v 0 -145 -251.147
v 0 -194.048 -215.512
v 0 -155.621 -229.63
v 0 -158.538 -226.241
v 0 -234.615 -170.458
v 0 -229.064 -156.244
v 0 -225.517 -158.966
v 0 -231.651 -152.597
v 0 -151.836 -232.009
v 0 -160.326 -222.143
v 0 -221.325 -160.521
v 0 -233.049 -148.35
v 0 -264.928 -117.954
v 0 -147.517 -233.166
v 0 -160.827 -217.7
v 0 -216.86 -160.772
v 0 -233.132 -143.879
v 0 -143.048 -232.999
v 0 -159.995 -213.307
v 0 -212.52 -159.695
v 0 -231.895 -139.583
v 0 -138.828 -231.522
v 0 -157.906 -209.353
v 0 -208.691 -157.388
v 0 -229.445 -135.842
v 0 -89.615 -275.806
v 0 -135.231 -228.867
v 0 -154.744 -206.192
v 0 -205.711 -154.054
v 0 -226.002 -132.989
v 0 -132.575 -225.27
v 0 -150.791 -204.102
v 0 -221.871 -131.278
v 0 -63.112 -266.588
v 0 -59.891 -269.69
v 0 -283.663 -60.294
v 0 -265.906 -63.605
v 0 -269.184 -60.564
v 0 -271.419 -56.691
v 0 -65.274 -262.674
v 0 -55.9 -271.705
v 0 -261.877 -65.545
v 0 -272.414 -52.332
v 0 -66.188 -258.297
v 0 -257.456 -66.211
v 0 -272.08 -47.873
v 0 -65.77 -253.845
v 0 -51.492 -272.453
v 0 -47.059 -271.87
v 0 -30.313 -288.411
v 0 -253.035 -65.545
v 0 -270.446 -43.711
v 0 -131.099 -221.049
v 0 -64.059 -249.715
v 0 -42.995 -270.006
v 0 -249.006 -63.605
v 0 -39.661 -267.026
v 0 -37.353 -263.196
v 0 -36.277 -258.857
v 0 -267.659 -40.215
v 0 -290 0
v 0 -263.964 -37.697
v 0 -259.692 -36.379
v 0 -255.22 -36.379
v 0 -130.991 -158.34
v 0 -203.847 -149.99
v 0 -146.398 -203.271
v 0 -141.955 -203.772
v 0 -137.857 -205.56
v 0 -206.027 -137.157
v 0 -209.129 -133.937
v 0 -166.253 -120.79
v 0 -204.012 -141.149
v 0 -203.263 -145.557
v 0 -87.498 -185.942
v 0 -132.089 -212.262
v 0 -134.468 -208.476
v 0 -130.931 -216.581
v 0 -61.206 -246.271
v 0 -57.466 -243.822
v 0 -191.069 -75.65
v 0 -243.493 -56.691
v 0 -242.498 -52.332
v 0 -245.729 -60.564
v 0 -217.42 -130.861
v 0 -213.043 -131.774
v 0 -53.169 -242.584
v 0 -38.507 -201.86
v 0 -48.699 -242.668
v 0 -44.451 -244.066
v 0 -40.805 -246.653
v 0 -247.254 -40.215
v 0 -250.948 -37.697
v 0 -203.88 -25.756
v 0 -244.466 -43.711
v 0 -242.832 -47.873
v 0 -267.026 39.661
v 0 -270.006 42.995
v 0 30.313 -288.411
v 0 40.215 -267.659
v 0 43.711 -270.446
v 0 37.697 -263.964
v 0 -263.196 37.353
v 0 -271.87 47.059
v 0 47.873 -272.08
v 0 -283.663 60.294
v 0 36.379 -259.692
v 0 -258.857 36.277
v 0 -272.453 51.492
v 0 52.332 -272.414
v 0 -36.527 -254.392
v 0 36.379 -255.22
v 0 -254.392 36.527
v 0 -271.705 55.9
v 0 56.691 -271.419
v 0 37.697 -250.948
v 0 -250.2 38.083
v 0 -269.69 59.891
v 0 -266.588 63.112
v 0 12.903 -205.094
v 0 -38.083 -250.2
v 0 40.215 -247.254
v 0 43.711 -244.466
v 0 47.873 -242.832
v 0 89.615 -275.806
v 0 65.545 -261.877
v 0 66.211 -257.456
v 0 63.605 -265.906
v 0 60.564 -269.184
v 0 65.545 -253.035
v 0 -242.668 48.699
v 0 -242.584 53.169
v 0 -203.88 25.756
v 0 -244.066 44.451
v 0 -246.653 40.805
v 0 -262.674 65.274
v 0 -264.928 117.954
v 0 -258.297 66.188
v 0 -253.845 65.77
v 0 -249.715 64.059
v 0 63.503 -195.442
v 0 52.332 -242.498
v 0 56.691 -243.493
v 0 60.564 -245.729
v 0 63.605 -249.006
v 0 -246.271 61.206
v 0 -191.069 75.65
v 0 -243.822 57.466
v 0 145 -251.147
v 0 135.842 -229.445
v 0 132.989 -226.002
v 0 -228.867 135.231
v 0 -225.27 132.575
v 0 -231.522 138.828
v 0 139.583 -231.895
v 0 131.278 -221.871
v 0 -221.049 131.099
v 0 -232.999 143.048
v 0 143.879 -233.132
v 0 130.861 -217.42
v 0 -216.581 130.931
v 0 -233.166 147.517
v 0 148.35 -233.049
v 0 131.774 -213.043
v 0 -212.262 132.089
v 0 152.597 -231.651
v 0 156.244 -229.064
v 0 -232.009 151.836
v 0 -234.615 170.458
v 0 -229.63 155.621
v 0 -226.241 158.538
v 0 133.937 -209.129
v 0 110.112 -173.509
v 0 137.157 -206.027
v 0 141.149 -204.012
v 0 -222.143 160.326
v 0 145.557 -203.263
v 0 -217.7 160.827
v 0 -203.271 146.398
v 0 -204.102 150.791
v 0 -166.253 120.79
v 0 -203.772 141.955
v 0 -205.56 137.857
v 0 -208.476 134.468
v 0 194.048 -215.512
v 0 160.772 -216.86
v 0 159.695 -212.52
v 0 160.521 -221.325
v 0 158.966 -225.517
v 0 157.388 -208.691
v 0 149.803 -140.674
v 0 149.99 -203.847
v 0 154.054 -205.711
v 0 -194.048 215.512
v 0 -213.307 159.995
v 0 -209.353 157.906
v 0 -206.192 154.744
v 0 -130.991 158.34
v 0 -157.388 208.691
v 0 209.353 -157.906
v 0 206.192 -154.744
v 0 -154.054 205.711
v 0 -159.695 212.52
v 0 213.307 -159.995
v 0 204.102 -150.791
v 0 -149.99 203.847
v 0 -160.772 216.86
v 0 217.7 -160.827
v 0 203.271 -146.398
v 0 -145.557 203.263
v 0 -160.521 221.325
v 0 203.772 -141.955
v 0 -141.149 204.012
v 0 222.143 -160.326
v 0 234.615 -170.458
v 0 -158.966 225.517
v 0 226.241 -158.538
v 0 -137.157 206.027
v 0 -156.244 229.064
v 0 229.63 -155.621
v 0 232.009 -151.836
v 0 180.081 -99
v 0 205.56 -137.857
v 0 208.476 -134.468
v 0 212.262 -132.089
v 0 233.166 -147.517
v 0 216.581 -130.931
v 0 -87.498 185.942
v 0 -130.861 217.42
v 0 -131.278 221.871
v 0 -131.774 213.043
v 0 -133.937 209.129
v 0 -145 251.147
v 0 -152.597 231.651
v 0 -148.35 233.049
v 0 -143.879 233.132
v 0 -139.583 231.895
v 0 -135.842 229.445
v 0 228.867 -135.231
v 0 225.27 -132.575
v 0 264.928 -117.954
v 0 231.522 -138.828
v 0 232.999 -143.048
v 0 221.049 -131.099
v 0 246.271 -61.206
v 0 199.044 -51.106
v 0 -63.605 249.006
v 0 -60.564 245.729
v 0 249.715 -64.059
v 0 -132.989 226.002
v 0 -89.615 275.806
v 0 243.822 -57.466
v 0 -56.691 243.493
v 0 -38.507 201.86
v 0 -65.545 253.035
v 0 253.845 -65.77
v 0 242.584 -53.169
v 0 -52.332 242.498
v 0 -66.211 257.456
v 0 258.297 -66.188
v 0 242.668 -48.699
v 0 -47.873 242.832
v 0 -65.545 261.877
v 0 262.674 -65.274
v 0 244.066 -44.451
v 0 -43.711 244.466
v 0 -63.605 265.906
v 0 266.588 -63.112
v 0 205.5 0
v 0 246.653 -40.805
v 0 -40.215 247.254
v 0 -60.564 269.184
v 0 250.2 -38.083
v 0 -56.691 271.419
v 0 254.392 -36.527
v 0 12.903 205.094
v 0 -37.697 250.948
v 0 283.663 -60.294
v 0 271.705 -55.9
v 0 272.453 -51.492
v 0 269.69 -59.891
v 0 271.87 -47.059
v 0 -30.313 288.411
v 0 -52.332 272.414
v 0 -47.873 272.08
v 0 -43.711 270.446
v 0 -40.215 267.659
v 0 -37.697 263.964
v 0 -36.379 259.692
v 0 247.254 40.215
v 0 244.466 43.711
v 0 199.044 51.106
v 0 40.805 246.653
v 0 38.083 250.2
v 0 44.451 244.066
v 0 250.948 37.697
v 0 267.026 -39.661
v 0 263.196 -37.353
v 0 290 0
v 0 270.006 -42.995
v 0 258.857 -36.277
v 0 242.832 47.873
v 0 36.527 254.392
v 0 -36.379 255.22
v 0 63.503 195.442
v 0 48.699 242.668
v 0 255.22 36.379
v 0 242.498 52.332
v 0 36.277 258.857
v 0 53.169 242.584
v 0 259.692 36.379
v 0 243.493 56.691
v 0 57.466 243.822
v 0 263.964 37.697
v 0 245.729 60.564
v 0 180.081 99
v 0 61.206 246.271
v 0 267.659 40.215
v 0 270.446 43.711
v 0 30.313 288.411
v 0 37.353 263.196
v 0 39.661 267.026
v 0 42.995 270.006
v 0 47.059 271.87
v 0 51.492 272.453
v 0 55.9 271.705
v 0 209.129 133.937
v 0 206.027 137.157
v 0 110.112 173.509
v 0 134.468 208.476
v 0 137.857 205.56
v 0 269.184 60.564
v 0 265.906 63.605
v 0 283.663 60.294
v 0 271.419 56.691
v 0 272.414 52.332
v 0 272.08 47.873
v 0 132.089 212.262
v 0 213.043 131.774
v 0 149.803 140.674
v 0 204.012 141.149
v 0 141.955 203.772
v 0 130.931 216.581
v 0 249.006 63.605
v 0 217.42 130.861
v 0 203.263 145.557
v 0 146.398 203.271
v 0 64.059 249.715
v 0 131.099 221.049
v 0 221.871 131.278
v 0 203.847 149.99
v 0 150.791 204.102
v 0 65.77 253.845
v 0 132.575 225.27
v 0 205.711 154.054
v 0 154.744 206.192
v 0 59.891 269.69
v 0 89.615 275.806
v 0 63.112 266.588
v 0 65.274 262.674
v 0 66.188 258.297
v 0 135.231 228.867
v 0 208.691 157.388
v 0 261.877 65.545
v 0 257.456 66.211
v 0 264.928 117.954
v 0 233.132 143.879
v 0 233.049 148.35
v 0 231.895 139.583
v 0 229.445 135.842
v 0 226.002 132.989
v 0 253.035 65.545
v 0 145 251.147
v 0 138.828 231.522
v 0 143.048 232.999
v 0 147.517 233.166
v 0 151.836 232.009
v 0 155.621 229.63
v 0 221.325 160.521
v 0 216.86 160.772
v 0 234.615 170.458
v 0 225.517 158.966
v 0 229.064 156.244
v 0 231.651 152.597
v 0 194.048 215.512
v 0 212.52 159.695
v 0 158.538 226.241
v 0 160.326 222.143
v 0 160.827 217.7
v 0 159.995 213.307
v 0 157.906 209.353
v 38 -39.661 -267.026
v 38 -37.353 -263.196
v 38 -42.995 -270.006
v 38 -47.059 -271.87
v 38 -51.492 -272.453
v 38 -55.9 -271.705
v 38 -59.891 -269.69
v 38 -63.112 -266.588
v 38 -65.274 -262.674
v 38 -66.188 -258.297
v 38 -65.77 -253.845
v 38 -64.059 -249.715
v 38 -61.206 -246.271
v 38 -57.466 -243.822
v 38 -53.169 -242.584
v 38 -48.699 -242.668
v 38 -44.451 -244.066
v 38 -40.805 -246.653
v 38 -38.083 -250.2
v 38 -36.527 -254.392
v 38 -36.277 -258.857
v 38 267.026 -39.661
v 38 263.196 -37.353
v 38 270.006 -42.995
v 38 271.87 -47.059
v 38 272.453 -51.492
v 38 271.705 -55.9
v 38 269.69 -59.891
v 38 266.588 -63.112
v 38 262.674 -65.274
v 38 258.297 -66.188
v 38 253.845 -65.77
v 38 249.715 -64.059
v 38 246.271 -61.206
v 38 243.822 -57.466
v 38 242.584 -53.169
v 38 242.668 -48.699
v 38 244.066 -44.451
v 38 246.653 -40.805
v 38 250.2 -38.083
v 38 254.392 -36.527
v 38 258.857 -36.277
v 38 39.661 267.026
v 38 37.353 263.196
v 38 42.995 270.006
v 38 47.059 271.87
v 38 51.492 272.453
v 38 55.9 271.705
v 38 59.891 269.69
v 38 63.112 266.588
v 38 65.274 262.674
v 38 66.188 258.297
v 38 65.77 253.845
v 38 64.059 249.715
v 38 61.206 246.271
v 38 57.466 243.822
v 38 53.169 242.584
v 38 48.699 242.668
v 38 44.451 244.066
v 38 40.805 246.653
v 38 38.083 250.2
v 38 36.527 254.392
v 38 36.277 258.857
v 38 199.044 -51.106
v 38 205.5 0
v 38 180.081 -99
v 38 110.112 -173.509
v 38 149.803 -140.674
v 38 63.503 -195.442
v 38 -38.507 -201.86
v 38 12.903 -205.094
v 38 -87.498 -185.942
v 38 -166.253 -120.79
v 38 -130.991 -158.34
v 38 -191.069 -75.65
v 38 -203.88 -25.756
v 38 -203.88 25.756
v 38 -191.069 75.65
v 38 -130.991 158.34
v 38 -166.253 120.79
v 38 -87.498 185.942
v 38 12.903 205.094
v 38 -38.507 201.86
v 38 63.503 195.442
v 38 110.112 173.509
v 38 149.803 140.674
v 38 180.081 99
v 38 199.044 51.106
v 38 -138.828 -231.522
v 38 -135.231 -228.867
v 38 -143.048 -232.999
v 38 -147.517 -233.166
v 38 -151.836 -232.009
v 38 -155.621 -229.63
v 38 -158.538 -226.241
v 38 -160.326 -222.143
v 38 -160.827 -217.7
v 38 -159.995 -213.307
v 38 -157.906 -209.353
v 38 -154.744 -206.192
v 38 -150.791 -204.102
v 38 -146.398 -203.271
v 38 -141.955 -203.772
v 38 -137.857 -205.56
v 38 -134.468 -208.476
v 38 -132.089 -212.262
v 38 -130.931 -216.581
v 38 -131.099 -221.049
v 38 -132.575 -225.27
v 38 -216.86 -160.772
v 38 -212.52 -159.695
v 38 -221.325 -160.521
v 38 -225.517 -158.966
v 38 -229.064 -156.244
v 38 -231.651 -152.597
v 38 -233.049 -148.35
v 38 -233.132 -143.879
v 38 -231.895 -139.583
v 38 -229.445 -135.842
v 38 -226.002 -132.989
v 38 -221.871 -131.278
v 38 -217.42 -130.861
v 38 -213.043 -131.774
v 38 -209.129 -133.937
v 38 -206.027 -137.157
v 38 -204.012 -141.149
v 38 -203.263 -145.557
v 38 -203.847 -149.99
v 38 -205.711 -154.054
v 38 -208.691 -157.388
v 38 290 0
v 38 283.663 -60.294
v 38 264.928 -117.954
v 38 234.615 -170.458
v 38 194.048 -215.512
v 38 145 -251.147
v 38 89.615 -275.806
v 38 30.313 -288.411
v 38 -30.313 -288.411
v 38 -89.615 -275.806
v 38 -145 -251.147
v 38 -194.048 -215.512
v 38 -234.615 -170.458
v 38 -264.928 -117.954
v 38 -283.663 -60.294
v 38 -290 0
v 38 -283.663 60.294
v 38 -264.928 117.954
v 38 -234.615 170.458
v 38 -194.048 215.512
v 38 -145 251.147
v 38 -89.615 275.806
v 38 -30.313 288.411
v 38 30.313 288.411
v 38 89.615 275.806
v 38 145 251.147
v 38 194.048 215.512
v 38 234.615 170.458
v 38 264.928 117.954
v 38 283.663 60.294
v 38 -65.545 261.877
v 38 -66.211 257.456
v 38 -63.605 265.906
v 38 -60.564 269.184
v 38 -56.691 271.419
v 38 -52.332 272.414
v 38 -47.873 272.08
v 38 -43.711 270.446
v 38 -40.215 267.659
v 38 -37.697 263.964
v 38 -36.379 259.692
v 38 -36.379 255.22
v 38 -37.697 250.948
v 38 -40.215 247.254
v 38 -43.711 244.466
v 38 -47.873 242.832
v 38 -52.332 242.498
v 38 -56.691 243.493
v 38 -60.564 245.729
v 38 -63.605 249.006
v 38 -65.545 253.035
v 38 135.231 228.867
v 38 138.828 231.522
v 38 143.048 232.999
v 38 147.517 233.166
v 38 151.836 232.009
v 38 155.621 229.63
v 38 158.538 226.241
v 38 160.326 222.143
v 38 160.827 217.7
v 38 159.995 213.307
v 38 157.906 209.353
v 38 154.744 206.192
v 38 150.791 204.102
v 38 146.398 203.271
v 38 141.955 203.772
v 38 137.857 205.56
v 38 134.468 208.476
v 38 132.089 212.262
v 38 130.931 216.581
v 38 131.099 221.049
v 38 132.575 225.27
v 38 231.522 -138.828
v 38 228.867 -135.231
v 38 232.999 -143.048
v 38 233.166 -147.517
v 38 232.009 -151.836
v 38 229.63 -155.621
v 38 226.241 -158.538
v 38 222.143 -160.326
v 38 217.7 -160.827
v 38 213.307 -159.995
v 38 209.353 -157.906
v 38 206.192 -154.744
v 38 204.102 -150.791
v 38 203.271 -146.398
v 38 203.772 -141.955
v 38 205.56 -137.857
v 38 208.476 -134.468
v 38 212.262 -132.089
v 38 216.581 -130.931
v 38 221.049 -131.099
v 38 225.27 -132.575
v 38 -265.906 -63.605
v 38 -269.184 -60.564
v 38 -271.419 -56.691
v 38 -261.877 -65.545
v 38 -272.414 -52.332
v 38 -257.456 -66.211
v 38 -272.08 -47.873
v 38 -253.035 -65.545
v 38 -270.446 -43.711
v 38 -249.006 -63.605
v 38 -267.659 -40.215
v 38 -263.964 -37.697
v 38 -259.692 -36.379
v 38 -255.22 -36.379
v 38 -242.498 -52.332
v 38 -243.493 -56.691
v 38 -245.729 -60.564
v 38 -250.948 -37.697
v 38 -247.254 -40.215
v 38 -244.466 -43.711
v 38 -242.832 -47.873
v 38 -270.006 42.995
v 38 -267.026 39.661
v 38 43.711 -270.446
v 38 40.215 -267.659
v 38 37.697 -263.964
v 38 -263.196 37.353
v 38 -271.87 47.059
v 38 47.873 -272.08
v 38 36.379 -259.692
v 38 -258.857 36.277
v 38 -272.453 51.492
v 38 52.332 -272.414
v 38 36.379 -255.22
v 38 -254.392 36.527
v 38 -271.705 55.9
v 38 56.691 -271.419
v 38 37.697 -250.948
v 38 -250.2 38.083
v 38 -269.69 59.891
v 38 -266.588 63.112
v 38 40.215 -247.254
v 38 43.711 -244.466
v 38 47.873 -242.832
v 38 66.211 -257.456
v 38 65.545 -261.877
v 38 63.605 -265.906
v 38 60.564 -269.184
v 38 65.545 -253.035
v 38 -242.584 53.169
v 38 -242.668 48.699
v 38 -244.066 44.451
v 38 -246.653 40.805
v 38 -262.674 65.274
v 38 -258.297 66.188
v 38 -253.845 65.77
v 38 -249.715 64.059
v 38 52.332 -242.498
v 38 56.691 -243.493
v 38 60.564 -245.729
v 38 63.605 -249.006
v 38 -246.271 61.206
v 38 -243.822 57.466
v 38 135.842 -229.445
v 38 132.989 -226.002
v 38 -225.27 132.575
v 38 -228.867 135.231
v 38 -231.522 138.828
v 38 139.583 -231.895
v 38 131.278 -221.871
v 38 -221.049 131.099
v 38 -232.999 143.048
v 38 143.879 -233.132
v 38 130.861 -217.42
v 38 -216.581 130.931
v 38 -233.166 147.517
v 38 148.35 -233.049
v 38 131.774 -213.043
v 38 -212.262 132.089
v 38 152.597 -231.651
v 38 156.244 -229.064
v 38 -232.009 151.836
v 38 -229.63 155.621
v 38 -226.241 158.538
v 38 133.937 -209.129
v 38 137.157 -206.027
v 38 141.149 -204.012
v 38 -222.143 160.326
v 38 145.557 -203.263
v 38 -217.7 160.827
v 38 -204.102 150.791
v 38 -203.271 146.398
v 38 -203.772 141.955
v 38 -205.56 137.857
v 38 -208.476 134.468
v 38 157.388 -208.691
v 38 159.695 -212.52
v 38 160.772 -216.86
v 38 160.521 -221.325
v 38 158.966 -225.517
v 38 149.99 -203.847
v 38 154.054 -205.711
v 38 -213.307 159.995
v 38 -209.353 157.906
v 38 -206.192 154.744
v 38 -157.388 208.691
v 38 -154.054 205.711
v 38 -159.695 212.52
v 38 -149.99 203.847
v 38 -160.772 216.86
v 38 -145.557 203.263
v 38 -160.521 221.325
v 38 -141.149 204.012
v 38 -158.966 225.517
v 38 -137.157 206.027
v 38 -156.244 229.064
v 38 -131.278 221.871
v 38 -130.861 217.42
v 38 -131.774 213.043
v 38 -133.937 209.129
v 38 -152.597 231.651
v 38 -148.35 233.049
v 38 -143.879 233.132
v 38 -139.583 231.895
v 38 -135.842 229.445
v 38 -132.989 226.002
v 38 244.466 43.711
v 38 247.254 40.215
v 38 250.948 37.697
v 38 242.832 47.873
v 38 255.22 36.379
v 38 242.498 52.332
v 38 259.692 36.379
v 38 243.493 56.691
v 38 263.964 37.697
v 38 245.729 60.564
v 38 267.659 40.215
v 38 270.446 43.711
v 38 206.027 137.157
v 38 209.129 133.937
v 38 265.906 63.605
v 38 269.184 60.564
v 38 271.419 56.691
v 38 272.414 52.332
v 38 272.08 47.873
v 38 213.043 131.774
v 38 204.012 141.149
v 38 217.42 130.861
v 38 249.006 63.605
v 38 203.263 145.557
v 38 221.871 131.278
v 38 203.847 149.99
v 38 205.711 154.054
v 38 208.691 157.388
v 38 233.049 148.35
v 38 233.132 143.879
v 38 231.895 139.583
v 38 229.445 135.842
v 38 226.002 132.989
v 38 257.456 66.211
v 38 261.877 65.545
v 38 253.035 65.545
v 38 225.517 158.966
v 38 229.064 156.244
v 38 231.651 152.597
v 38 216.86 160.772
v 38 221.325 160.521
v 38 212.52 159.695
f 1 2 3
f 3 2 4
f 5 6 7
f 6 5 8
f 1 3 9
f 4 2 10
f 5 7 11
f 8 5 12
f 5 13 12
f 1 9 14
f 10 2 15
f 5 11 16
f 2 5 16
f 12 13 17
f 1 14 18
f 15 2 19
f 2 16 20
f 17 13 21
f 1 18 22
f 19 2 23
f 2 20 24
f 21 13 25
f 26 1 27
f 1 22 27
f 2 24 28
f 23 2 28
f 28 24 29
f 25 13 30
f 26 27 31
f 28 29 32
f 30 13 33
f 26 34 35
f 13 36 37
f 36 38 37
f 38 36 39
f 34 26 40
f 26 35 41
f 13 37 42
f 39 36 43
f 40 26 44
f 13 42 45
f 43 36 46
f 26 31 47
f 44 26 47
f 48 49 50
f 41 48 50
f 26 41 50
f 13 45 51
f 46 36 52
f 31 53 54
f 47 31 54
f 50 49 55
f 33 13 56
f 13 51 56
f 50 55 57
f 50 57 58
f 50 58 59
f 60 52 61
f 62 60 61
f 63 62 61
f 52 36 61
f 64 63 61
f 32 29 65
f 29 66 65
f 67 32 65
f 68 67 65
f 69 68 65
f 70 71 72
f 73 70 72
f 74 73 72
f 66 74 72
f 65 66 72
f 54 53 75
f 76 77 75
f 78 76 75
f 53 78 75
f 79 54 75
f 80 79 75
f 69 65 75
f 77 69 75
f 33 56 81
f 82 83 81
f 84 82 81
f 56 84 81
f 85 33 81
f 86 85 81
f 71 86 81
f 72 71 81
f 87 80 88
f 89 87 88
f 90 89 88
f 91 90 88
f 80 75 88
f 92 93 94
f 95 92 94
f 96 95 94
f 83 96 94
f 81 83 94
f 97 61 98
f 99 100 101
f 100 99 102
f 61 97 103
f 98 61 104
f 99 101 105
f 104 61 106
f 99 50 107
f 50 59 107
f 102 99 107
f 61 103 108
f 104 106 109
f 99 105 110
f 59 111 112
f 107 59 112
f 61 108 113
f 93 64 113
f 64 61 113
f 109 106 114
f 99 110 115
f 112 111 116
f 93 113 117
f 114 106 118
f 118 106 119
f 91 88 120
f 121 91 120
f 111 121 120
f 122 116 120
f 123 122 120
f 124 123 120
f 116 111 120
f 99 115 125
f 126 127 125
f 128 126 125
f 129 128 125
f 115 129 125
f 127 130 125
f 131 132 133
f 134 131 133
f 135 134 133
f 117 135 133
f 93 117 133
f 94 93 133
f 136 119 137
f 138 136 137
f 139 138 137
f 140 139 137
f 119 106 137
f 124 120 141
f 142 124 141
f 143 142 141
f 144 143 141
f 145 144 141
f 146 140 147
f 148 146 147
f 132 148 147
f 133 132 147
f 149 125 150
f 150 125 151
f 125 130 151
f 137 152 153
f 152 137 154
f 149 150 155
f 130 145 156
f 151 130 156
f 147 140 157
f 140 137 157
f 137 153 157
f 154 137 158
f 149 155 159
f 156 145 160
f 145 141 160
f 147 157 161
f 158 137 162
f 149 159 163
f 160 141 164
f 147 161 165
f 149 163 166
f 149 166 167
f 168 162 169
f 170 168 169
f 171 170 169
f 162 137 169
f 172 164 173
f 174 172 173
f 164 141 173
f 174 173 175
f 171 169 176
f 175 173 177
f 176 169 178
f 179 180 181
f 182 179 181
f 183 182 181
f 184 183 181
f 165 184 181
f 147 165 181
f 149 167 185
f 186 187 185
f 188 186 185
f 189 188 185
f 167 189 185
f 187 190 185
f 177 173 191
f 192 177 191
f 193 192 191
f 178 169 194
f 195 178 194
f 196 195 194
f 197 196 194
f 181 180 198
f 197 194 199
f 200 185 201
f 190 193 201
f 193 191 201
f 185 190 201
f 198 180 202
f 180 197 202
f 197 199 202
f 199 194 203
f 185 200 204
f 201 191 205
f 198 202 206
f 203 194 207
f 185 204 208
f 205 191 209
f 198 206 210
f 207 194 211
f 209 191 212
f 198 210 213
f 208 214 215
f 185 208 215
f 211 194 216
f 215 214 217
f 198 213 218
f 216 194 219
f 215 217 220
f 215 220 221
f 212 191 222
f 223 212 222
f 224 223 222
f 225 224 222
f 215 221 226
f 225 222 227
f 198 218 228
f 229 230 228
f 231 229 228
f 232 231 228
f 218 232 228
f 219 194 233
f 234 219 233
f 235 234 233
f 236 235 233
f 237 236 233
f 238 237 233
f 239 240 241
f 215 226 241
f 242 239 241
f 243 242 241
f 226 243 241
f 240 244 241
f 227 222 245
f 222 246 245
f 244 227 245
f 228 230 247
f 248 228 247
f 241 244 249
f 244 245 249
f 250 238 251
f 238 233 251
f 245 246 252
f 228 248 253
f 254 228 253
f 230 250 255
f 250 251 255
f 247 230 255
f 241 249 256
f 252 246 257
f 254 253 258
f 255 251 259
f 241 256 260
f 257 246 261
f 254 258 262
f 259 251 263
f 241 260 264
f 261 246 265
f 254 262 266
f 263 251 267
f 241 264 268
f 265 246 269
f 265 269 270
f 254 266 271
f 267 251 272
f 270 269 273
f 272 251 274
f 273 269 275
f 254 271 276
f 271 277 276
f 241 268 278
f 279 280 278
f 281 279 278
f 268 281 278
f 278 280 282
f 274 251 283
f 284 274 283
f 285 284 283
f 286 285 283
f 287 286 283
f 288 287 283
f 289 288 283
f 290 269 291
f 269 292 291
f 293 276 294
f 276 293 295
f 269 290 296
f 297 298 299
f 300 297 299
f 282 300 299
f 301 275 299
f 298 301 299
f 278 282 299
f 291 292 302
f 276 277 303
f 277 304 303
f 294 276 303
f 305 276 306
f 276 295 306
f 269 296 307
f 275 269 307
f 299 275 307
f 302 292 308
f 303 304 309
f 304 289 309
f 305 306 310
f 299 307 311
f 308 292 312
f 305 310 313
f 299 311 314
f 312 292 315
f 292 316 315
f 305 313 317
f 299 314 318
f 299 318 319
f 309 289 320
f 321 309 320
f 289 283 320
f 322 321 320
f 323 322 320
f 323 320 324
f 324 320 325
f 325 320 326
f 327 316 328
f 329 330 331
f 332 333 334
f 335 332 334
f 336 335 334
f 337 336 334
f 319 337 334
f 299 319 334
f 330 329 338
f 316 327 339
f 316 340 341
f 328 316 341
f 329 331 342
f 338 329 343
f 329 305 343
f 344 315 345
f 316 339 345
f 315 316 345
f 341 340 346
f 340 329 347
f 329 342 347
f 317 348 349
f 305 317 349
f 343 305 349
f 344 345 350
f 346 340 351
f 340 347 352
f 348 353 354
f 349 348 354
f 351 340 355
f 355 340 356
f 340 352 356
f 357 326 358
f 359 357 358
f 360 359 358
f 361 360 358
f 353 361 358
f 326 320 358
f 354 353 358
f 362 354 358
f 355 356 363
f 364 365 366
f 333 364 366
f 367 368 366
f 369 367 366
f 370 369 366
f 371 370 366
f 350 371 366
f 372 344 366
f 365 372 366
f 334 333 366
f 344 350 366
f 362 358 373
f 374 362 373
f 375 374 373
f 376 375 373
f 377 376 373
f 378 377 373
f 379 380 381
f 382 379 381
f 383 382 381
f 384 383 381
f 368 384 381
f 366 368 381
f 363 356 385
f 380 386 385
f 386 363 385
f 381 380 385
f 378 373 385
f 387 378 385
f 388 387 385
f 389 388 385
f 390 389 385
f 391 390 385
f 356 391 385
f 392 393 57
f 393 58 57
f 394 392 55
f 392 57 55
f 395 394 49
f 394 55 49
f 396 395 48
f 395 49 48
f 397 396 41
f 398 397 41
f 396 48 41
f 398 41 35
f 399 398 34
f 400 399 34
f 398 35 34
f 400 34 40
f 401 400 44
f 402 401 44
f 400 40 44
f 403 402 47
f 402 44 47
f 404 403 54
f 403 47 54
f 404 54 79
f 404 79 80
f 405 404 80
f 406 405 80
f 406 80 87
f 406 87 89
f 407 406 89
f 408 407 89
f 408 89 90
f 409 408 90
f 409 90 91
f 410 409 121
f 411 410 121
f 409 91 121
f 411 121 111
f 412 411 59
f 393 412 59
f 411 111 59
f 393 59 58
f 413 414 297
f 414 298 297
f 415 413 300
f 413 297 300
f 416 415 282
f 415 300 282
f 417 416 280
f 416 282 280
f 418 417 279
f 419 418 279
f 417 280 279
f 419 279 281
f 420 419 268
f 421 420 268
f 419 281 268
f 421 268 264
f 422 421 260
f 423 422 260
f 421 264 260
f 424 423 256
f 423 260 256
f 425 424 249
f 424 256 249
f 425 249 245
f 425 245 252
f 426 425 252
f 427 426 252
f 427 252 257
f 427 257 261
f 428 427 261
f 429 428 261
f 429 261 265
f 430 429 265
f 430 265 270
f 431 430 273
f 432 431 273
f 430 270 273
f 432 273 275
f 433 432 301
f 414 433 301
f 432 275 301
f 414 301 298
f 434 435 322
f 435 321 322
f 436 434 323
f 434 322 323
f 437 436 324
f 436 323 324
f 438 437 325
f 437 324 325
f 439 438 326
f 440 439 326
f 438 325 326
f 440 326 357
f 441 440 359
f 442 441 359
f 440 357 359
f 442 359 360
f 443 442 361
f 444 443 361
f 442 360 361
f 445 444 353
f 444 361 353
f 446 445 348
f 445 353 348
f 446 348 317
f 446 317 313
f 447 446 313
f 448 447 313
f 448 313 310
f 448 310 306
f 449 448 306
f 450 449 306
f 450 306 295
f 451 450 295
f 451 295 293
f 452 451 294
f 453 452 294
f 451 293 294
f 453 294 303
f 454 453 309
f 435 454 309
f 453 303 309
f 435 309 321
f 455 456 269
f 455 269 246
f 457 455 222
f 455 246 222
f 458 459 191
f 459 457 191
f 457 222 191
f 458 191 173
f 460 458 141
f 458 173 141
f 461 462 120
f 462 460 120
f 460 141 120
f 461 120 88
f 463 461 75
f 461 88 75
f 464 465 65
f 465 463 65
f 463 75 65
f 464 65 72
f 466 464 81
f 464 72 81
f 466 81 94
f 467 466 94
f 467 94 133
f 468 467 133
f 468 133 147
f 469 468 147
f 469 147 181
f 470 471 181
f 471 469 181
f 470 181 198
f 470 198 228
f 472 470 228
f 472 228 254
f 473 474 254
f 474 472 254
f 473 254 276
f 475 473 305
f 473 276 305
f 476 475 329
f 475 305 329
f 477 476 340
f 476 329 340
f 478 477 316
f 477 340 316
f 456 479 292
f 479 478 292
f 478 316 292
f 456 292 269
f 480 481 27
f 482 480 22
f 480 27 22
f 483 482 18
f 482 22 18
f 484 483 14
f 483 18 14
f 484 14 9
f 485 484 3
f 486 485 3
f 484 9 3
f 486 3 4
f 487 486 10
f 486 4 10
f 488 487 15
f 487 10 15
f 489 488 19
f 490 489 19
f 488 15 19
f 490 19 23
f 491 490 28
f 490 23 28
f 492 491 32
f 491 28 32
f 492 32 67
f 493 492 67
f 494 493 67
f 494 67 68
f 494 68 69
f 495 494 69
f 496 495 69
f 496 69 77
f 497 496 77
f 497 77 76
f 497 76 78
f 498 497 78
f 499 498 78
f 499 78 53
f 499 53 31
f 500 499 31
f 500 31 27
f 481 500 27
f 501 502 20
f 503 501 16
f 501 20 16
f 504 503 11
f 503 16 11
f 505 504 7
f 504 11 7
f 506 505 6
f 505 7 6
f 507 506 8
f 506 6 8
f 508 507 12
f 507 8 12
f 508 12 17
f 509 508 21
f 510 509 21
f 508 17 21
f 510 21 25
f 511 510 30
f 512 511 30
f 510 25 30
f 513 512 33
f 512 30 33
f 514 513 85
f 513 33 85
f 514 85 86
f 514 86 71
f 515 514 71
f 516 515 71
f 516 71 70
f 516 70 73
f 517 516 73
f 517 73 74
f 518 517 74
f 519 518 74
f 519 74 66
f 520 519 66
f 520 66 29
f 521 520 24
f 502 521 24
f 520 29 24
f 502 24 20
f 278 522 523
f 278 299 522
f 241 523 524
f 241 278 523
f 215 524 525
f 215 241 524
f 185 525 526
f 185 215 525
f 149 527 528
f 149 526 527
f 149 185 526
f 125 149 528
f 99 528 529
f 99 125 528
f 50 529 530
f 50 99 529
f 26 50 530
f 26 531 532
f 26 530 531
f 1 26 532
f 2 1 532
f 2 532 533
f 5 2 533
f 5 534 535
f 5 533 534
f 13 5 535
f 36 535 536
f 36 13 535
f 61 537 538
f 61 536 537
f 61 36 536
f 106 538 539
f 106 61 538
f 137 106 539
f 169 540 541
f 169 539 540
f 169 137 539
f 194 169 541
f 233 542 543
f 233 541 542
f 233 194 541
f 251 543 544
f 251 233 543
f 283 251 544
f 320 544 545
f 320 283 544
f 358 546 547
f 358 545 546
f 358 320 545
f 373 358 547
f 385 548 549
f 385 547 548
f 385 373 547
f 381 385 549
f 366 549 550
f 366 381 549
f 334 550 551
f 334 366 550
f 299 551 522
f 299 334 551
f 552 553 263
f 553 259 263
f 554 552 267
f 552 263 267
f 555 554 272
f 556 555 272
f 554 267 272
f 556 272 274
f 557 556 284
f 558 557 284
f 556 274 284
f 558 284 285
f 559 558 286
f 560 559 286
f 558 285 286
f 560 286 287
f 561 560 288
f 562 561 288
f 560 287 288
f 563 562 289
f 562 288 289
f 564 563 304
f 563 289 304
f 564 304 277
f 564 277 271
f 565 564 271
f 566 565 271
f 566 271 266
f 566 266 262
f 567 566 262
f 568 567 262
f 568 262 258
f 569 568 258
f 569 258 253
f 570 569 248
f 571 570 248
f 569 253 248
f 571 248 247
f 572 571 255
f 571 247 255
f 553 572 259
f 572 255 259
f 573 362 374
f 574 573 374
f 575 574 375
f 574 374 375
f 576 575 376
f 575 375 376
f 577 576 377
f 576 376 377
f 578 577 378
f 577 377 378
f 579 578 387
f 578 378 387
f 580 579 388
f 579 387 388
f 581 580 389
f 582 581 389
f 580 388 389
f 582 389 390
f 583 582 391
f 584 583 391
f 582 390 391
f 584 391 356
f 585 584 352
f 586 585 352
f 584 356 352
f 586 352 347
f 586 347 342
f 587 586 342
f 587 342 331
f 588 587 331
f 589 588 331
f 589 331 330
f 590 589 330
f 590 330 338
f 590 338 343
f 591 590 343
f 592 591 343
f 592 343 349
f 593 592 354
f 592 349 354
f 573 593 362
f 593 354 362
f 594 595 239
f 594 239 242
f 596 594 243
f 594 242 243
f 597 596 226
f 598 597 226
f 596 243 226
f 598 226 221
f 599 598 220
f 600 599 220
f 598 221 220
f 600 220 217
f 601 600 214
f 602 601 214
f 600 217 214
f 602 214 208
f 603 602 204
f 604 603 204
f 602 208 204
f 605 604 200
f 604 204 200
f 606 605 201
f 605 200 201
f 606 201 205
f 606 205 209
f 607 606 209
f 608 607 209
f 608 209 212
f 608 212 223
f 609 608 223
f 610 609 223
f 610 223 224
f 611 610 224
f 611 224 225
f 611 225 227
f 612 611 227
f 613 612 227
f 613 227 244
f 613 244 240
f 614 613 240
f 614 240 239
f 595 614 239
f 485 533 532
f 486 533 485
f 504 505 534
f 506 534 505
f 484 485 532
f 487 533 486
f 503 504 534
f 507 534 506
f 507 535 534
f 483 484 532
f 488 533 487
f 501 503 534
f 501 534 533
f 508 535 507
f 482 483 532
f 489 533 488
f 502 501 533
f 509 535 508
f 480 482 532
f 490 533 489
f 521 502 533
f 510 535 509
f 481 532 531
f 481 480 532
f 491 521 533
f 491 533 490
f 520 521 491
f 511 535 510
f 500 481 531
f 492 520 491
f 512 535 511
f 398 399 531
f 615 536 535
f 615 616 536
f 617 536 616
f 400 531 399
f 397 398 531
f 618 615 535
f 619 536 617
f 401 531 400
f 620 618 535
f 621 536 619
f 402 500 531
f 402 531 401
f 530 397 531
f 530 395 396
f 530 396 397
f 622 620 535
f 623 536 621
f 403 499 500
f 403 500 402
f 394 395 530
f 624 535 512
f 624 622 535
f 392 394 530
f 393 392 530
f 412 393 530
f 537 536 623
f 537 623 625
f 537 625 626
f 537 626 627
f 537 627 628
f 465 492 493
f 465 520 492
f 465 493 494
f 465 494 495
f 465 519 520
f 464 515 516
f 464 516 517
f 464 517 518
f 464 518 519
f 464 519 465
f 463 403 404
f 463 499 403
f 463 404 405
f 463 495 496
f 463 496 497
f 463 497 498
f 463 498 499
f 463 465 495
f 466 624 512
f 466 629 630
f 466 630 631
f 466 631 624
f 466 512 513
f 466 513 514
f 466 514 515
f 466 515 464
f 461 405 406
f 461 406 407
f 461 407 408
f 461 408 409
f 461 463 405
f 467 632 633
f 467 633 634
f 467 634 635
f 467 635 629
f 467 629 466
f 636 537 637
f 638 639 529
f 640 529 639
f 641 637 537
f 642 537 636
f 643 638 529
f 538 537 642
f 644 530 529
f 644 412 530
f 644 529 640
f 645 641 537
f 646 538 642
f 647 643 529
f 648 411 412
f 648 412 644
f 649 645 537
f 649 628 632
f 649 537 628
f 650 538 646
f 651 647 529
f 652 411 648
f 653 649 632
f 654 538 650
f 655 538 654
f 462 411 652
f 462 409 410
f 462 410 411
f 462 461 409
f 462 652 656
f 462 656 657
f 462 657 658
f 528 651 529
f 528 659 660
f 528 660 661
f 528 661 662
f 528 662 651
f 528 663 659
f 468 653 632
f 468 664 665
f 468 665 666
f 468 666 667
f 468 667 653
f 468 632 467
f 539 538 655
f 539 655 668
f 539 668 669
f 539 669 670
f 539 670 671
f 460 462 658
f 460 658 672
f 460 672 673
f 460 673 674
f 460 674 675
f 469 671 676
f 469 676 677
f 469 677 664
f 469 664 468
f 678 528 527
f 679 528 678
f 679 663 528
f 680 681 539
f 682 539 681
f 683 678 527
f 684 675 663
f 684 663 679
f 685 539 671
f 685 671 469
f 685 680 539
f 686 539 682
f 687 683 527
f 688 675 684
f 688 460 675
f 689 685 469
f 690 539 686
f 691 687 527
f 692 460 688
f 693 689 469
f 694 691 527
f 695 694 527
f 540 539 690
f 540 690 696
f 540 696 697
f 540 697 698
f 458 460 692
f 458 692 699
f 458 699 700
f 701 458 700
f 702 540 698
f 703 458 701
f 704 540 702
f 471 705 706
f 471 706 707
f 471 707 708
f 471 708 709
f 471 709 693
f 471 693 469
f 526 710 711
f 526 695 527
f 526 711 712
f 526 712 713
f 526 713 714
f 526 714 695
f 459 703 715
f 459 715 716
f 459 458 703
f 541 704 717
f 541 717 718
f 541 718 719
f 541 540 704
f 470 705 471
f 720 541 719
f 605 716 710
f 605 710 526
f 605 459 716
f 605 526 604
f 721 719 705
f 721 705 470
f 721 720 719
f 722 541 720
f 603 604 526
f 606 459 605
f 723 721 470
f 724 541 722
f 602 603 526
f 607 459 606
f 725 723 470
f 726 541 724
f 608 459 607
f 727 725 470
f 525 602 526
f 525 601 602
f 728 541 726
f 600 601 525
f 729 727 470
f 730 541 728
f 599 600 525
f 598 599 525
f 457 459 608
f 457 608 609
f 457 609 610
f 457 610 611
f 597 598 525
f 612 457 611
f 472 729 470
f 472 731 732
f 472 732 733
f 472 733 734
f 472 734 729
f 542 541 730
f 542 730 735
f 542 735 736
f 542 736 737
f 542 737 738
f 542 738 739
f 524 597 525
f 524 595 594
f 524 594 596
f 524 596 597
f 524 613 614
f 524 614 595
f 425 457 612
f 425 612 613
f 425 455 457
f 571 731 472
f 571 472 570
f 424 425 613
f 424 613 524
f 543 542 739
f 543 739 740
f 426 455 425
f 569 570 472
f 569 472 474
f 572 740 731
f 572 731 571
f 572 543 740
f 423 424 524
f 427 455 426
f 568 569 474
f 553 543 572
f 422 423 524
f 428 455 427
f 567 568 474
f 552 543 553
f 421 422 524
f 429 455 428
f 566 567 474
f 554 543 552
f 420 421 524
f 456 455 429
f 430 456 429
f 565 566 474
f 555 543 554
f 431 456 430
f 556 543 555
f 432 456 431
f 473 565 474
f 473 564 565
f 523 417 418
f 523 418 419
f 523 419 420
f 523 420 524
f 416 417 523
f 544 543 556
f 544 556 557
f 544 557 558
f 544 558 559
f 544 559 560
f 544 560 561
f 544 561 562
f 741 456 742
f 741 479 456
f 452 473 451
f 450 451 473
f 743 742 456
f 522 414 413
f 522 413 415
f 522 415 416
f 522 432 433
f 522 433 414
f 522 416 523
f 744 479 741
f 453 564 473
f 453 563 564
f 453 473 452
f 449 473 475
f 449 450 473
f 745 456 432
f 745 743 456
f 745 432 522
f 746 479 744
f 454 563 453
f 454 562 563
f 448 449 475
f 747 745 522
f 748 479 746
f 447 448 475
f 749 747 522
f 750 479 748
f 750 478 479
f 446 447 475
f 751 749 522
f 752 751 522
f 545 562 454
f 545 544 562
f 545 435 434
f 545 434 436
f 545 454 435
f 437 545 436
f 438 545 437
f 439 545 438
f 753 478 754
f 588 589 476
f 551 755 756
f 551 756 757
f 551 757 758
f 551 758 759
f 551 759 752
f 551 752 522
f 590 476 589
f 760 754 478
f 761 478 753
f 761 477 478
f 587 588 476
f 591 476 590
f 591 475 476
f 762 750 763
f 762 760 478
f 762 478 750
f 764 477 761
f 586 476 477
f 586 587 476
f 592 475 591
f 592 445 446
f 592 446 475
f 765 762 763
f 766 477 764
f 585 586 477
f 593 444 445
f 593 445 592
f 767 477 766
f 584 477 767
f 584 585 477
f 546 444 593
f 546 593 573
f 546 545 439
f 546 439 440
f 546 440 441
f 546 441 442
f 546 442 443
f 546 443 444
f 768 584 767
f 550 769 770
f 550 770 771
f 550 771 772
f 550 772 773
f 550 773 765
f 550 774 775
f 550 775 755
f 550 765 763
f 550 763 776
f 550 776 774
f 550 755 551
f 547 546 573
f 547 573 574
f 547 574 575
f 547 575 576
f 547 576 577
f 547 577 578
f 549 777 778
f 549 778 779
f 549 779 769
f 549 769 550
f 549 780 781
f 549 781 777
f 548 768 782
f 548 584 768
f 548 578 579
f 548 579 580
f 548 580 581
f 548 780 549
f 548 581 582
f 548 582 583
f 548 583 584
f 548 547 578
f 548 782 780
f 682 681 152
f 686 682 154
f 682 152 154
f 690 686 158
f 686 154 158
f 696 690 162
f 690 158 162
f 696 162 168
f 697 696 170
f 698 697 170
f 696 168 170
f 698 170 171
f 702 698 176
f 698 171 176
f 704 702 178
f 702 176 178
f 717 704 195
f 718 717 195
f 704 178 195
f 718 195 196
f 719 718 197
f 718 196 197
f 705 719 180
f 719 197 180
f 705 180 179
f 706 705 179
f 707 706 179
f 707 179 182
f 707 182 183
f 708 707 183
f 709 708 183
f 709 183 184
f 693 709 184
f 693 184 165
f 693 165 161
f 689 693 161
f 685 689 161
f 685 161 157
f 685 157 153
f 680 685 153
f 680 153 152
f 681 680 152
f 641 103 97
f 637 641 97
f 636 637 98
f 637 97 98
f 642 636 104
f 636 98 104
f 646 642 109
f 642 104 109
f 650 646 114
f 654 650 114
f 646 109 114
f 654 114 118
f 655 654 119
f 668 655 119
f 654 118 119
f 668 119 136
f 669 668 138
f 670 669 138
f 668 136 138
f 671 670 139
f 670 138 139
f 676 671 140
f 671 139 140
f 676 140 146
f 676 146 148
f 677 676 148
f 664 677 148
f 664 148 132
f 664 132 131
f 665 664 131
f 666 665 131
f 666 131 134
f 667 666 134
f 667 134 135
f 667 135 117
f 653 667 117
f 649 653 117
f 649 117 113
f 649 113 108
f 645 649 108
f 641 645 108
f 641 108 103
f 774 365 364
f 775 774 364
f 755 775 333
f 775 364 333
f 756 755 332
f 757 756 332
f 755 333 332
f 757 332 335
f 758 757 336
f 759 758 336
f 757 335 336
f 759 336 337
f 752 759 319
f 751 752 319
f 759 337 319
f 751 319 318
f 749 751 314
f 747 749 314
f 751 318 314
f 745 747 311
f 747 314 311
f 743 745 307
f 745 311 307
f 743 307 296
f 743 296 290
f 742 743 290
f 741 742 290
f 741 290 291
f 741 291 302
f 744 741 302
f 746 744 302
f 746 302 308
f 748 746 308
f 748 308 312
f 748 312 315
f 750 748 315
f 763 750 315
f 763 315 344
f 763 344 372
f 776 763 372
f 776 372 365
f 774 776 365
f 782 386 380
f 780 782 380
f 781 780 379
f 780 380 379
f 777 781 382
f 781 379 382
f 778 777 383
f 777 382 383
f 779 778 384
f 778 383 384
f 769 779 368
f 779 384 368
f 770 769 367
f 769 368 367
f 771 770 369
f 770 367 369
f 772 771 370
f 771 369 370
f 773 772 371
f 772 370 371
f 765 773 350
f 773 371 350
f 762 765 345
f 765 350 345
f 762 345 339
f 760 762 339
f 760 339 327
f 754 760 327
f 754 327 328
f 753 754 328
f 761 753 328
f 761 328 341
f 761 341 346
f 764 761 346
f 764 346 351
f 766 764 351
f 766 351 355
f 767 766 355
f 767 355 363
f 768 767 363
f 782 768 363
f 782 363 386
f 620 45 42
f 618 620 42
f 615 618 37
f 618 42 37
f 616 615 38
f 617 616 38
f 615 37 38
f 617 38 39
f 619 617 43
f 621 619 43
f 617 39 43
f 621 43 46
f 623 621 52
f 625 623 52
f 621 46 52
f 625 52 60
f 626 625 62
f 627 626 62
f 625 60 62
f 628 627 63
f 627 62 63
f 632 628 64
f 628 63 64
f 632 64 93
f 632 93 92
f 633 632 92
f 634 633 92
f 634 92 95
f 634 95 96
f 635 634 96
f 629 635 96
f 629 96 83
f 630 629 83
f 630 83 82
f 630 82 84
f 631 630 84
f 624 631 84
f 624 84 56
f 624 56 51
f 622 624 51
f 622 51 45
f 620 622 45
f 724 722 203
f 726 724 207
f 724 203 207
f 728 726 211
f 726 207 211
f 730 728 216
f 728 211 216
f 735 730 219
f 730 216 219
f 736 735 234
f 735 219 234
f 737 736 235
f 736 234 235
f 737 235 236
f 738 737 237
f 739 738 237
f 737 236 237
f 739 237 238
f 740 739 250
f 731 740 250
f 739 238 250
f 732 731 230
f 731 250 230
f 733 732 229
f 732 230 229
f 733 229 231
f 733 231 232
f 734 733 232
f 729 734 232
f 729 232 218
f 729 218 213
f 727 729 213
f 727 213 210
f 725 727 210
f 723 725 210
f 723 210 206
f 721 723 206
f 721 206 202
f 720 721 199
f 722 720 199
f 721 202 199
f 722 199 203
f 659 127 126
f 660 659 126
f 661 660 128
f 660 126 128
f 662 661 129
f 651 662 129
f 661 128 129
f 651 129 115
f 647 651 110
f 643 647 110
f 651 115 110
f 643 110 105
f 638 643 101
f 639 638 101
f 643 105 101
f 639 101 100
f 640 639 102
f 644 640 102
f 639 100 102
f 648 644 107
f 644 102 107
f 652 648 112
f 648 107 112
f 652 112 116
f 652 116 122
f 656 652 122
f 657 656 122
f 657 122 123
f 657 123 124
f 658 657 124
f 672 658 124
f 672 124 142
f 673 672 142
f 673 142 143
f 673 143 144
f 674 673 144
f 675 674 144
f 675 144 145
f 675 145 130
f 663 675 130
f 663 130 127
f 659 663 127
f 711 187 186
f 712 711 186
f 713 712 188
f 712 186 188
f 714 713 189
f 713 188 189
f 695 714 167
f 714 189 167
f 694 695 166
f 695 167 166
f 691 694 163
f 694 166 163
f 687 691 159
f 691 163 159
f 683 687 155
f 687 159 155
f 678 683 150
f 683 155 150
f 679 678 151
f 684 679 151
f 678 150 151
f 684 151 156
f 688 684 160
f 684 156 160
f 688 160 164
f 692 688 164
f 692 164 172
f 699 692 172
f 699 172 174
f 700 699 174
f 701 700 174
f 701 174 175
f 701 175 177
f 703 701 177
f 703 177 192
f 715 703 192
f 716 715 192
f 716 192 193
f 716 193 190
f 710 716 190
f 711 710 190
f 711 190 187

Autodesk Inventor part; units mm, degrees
ref_plane "YZ Plane" through (0, 0, 0) normal (1, 0, 0) x (0, 1, 0)
ref_plane "XZ Plane" through (0, 0, 0) normal (0, 1, 0) x (-1, 0, 0)
ref_plane "XY Plane" through (0, 0, 0) normal (0, 0, 1) x (1, 0, 0)
sketch "Sketch1" plane through (0, 0, 0) normal (0, 0, 1) x (1, 0, 0)
  line L0 (38, 290) -> (0, 290)
  line L1 (0, 290) -> (0, 205.5)
  line L2 (0, 205.5) -> (0, 0) construction
  line L3 (0, 0) -> (38, 0) construction
  line L4 (38, 290) -> (38, 205.5)
  line L5 (38, 205.5) -> (0, 205.5)
  line L6 (38, 205.5) -> (38, 0) construction
  dimension "d0" = 580
  dimension "d1" = 38
  dimension "d5" = 411
revolve "Revolution1" add sketch "Sketch1" angle 360 about axis through (0, 0, 0) along (1, 0, 0)
sketch "Sketch2" plane through (0, 0, 0) normal (-1, 0, 0) x (0, 0, 1)
  circle A0 centre (0, 0) radius 205.5 projected
  line L0 (0, 262.5) -> (0, 0) construction
  circle A1 centre (0, 0) radius 290 projected
  circle A2 centre (0, 0) radius 262.5 construction
  line L1 (0, 0) -> (51.2112, 257.4561) construction
  circle A3 centre (51.2112, 257.4561) radius 15
  dimension "d6" = 30
  dimension "d7" = 262.5
  dimension "d8" = 11.25
extrude "Extrusion1" cut sketch "Sketch2" against normal through all contours A3
pattern_circular "Circular Pattern1" count 16 over 360 about axis through (19, 0, 0) along (1, 0, 0) of "Extrusion1"
equation "\"d6\" = dd2"
equation "\"d7\" = 0.5 * k"
equation "\"d0\" = D"
equation "\"d1\" = b"
equation "\"d5\" = dd5"
equation "\"b\" = 38"
equation "\"D\" = 580"
equation "\"k\" = 525"
equation "\"dd2\" = 30"
equation "\"dd5\" = 411"
equation "\"Size_Designation\" = 1.2345"
properties part number "DIN EN 1092-1 Plate Flange for Welding Type 01 - PN 16 400 x 406.4(1)" material "Steel"
